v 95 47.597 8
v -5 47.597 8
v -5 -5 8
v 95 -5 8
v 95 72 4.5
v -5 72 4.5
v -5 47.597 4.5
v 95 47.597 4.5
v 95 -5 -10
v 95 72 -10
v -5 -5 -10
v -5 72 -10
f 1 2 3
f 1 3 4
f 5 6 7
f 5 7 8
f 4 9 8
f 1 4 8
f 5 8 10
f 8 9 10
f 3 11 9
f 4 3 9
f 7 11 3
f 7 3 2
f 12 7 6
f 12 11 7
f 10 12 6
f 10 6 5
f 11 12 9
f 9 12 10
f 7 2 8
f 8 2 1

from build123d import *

# Parameters (mm, degrees)
SKETCH2_W           = 100
SKETCH2_H           = 77
BOSS_EXTRUDE1_DEPTH = 18
SKETCH3_W           = 100
SKETCH3_H           = 24.402527788
CUT_EXTRUDE1_DEPTH  = 3.5


with BuildPart() as part:
    # Sketch2 → Boss-Extrude1 (new body)
    with BuildSketch(Plane.XY.offset(-10)):
        with Locations((45, 33.5)):
            Rectangle(SKETCH2_W, SKETCH2_H)
    extrude(amount=BOSS_EXTRUDE1_DEPTH)

    # Sketch3 → Cut-Extrude1 (cut)
    with BuildSketch(Plane.XY.offset(8)):
        with Locations((45, 59.798736106)):
            Rectangle(SKETCH3_W, SKETCH3_H)
    extrude(amount=-CUT_EXTRUDE1_DEPTH, mode=Mode.SUBTRACT)


solid = part.part
